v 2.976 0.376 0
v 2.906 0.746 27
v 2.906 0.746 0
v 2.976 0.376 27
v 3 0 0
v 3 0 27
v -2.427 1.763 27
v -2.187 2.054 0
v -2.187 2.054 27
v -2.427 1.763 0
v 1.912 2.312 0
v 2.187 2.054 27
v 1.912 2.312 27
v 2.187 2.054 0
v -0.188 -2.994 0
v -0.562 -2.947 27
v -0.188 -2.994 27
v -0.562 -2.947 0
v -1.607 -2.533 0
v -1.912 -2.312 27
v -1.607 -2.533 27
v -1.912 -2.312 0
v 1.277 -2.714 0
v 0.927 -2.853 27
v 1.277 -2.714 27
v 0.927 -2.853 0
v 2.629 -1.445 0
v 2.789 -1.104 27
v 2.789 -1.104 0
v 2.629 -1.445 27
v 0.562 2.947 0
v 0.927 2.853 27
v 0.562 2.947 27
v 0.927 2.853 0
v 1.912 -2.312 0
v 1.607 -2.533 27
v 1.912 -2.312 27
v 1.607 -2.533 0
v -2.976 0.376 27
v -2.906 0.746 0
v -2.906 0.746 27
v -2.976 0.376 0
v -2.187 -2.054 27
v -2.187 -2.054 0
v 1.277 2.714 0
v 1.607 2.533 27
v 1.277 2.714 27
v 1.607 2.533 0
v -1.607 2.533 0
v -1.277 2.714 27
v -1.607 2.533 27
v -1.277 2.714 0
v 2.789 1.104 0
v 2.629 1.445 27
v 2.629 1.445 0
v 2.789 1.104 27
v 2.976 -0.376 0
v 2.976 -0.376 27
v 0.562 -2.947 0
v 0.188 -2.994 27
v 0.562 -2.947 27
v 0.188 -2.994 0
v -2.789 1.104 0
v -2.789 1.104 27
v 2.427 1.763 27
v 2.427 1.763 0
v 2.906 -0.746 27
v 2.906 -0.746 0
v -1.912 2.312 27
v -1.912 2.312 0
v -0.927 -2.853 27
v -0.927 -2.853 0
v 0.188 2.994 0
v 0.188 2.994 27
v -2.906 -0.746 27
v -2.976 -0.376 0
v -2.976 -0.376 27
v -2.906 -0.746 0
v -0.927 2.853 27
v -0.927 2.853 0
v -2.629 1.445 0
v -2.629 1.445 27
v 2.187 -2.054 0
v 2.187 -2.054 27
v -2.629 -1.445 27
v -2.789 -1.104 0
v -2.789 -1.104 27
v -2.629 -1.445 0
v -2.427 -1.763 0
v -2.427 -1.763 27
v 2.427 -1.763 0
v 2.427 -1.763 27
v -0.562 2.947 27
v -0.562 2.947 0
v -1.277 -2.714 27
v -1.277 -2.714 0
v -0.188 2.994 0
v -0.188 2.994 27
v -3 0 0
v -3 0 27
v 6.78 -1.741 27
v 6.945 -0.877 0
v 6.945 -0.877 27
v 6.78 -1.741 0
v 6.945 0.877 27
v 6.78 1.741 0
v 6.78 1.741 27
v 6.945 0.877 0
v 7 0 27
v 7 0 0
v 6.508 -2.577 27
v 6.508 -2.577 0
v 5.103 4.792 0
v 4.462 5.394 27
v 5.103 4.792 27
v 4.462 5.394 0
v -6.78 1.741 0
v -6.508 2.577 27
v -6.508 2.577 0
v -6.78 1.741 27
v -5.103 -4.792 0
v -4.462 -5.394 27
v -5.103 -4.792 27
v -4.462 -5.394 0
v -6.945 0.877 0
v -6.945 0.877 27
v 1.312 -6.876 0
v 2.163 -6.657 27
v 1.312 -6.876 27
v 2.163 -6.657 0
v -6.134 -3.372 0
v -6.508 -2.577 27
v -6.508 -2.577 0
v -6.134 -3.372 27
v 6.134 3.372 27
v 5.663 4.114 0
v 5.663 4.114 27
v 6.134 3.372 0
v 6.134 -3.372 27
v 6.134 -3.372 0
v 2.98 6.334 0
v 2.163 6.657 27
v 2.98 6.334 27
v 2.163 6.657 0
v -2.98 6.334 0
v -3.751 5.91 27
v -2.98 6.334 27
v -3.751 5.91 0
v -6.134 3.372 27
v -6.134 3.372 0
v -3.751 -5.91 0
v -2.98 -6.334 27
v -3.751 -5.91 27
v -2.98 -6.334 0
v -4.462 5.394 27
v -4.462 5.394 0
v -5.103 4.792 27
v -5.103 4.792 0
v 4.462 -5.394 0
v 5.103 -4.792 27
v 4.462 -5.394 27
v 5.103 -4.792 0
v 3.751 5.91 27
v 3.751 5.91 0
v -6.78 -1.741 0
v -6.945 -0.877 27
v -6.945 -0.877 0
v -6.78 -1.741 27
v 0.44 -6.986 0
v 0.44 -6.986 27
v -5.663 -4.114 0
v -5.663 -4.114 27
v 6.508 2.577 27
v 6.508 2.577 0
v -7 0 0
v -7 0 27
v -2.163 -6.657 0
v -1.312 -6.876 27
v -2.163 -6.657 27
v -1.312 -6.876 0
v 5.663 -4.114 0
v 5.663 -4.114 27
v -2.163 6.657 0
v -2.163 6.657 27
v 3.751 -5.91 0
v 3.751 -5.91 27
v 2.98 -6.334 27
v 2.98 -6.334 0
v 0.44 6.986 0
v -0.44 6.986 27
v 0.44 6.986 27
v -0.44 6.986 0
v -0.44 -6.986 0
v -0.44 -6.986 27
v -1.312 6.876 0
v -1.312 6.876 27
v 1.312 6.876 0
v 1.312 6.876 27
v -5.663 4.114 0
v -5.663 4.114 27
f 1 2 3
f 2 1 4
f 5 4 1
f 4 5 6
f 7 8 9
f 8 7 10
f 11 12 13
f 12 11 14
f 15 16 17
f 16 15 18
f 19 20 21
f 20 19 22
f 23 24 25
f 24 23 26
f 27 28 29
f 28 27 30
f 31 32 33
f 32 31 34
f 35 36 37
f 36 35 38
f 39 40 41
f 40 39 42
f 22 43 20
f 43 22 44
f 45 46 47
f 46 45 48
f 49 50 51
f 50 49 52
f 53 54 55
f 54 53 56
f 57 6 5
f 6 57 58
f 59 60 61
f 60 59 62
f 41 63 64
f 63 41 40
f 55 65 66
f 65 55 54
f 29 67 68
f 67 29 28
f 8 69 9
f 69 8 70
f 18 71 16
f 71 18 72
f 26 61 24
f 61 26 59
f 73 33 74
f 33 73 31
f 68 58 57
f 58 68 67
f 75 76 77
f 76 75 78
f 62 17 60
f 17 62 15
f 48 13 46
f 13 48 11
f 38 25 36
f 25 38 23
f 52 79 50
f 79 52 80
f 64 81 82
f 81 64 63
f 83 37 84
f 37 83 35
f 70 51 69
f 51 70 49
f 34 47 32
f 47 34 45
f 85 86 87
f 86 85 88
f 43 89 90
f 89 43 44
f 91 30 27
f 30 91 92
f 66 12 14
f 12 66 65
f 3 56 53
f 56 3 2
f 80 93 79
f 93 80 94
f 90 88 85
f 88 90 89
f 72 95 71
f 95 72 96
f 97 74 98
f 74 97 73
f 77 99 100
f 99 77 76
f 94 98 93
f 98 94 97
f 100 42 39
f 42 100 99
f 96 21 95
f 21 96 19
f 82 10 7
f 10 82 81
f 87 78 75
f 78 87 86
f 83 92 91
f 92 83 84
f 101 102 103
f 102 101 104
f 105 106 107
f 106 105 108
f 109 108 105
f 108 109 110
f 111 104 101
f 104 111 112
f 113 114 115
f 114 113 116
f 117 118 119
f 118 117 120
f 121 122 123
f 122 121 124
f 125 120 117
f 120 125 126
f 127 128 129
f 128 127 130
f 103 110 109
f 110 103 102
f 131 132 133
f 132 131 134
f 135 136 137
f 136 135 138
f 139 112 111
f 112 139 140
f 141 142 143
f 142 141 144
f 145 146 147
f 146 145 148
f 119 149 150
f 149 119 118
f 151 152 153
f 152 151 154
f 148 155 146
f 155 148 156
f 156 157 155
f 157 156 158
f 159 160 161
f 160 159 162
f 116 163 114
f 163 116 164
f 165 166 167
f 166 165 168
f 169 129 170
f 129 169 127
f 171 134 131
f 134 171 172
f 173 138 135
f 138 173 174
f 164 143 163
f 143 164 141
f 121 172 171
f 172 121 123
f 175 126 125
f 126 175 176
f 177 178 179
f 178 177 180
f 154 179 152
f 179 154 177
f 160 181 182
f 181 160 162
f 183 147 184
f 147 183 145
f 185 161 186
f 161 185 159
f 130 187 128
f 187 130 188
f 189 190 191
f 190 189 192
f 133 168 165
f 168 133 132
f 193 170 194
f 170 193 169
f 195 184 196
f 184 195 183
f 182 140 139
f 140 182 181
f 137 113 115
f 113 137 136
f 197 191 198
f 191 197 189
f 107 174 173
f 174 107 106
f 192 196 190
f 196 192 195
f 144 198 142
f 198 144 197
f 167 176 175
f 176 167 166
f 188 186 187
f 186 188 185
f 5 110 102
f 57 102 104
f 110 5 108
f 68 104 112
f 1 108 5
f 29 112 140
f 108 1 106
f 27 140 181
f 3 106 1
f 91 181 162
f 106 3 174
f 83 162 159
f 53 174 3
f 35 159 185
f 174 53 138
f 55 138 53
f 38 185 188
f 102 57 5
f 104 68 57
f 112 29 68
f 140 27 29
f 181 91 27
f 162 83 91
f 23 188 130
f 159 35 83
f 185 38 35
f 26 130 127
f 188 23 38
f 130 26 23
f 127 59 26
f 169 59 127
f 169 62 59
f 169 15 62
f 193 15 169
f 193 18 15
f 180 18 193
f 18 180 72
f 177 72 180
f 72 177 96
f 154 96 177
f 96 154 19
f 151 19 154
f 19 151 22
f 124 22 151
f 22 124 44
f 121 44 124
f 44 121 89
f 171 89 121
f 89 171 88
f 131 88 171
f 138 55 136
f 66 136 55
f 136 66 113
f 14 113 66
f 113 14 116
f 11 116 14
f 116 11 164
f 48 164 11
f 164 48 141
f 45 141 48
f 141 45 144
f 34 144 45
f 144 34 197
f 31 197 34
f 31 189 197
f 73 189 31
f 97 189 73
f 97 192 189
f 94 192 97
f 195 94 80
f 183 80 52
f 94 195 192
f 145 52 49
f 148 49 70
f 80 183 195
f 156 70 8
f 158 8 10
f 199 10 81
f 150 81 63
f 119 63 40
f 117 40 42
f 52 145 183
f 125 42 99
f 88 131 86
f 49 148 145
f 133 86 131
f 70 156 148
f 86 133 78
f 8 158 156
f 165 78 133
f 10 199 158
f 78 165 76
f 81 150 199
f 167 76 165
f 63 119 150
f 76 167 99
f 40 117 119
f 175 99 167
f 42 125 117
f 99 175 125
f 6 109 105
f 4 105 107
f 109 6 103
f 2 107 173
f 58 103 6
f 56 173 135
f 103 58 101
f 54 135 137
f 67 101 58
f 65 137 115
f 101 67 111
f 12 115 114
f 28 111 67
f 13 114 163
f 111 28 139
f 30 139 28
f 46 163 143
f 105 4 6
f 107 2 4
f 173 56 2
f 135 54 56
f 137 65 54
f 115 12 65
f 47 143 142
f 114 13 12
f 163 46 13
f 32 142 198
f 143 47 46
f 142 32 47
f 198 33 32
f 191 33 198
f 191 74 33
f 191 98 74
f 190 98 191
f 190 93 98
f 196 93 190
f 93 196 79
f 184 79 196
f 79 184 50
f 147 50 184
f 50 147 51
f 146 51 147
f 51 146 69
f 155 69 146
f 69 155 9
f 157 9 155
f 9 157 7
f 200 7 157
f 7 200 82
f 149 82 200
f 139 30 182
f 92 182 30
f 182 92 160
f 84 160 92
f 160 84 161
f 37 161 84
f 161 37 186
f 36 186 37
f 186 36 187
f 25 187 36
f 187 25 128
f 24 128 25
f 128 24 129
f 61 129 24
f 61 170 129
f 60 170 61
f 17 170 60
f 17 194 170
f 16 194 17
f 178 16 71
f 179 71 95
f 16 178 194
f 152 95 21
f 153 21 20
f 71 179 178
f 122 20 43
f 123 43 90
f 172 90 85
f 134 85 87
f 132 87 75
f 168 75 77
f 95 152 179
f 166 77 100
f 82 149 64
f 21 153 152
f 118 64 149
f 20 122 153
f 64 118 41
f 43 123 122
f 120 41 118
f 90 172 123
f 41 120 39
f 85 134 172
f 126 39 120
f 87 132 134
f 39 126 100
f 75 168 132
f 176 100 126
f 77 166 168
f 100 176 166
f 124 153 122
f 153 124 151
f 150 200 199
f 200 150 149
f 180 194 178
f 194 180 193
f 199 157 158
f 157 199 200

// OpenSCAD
$fn = 50;


difference() {
	union() {
		*color(alpha = 1.0000000000, c = "gray") {
			translate(v = [0, 7, 0]) {
				linear_extrude(height = 1) {
					text(font = "Arial:style=Bold", halign = "center", size = 4.5000000000, text = "COMMENT plate main", valign = "center");
				}
			}
		}
		*color(alpha = 1.0000000000, c = "gray") {
			translate(v = [0, 14, 0]) {
				linear_extrude(height = 1) {
					text(font = "Arial:style=Bold", halign = "center", size = 4.5000000000, text = "COMMENT description oobb_plate_shape_p_type_27_depth_1_width_1_height_27_thickness_true_both_holes", valign = "center");
				}
			}
		}
		cylinder(h = 27, r = 7.0000000000);
	}
	union() {
		*color(alpha = 1.0000000000, c = "gray") {
			translate(v = [0, 7, 0]) {
				linear_extrude(height = 1) {
					text(font = "Arial:style=Bold", halign = "center", size = 4.5000000000, text = "COMMENT holes main", valign = "center");
				}
			}
		}
		*color(alpha = 1.0000000000, c = "gray") {
			translate(v = [0, 14, 0]) {
				linear_extrude(height = 1) {
					text(font = "Arial:style=Bold", halign = "center", size = 4.5000000000, text = "COMMENT description oobb_holes_shape_n_type_1_width_1_height_27_thickness_true_both_holes", valign = "center");
				}
			}
		}
		translate(v = [0, 0, -50]) {
			cylinder(h = 100, r = 3.0000000000);
		}
		translate(v = [0, 0, -50]) {
			cylinder(h = 100, r = 1.5000000000);
		}
	}
}
